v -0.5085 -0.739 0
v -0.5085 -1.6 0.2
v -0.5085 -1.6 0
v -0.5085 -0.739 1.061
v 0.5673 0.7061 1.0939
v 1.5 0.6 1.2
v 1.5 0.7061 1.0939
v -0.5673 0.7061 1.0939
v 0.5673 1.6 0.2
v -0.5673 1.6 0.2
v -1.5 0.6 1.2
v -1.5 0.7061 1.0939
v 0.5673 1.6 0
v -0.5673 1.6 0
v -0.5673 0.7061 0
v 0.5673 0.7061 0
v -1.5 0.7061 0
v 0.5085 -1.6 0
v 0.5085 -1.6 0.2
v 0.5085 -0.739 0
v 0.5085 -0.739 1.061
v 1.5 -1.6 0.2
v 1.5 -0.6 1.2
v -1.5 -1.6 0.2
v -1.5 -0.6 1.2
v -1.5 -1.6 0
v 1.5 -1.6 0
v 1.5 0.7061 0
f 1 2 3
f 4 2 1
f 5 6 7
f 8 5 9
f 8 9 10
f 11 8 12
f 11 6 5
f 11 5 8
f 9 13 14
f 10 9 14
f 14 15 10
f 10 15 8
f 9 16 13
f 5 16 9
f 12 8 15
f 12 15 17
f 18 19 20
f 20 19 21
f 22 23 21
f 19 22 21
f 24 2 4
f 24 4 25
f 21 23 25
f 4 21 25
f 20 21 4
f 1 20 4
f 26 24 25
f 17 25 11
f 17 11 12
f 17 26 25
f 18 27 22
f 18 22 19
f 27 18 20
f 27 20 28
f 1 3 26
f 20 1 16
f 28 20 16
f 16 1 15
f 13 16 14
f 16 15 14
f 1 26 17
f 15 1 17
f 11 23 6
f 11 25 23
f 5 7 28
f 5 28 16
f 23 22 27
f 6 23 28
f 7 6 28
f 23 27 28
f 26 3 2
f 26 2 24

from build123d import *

# Parameters (mm, degrees)
SKETCH_W             = 3.2
SKETCH_H             = 3
PAD_DEPTH            = 1.2
CHAMFER_SIZE         = 1
SKETCH001_W          = 2.02194
SKETCH001_H          = 1.017
SKETCH001_W_2        = 1.827716
SKETCH001_H_2        = 1.145398
POCKET_DEPTH         = 5
BODY_PLACEMENT_ANGLE = 90


with BuildPart() as part:
    # Sketch → Pad (new body)
    with BuildSketch(Plane.XY):
        Rectangle(SKETCH_W, SKETCH_H)
    extrude(amount=PAD_DEPTH)

    # Chamfer
    chamfer_edges = [part.edges().sort_by_distance(p)[0] for p in [
        (-1.6, 0, 1.2),
        (1.6, 0, 1.2),
    ]]
    chamfer(chamfer_edges, length=CHAMFER_SIZE)

    # Sketch001 (on Face5 of Chamfer) → Pocket (cut)
    with BuildSketch(Plane.XY.offset(1.2)):
        with Locations((-1.75, 0)):
            Rectangle(SKETCH001_W, SKETCH001_H)
        with Locations((1.62, 1.14)):
            Rectangle(SKETCH001_W_2, SKETCH001_H_2)
        with Locations((1.62, -1.14)):
            Rectangle(SKETCH001_W_2, SKETCH001_H_2)
    extrude(amount=-POCKET_DEPTH, mode=Mode.SUBTRACT)


with BuildPart() as part_1:
    # Body placement: moved
    add(part.part.rotate(Axis((0, 0, 0), (0, 0, 1)), BODY_PLACEMENT_ANGLE))


solid = part_1.part
